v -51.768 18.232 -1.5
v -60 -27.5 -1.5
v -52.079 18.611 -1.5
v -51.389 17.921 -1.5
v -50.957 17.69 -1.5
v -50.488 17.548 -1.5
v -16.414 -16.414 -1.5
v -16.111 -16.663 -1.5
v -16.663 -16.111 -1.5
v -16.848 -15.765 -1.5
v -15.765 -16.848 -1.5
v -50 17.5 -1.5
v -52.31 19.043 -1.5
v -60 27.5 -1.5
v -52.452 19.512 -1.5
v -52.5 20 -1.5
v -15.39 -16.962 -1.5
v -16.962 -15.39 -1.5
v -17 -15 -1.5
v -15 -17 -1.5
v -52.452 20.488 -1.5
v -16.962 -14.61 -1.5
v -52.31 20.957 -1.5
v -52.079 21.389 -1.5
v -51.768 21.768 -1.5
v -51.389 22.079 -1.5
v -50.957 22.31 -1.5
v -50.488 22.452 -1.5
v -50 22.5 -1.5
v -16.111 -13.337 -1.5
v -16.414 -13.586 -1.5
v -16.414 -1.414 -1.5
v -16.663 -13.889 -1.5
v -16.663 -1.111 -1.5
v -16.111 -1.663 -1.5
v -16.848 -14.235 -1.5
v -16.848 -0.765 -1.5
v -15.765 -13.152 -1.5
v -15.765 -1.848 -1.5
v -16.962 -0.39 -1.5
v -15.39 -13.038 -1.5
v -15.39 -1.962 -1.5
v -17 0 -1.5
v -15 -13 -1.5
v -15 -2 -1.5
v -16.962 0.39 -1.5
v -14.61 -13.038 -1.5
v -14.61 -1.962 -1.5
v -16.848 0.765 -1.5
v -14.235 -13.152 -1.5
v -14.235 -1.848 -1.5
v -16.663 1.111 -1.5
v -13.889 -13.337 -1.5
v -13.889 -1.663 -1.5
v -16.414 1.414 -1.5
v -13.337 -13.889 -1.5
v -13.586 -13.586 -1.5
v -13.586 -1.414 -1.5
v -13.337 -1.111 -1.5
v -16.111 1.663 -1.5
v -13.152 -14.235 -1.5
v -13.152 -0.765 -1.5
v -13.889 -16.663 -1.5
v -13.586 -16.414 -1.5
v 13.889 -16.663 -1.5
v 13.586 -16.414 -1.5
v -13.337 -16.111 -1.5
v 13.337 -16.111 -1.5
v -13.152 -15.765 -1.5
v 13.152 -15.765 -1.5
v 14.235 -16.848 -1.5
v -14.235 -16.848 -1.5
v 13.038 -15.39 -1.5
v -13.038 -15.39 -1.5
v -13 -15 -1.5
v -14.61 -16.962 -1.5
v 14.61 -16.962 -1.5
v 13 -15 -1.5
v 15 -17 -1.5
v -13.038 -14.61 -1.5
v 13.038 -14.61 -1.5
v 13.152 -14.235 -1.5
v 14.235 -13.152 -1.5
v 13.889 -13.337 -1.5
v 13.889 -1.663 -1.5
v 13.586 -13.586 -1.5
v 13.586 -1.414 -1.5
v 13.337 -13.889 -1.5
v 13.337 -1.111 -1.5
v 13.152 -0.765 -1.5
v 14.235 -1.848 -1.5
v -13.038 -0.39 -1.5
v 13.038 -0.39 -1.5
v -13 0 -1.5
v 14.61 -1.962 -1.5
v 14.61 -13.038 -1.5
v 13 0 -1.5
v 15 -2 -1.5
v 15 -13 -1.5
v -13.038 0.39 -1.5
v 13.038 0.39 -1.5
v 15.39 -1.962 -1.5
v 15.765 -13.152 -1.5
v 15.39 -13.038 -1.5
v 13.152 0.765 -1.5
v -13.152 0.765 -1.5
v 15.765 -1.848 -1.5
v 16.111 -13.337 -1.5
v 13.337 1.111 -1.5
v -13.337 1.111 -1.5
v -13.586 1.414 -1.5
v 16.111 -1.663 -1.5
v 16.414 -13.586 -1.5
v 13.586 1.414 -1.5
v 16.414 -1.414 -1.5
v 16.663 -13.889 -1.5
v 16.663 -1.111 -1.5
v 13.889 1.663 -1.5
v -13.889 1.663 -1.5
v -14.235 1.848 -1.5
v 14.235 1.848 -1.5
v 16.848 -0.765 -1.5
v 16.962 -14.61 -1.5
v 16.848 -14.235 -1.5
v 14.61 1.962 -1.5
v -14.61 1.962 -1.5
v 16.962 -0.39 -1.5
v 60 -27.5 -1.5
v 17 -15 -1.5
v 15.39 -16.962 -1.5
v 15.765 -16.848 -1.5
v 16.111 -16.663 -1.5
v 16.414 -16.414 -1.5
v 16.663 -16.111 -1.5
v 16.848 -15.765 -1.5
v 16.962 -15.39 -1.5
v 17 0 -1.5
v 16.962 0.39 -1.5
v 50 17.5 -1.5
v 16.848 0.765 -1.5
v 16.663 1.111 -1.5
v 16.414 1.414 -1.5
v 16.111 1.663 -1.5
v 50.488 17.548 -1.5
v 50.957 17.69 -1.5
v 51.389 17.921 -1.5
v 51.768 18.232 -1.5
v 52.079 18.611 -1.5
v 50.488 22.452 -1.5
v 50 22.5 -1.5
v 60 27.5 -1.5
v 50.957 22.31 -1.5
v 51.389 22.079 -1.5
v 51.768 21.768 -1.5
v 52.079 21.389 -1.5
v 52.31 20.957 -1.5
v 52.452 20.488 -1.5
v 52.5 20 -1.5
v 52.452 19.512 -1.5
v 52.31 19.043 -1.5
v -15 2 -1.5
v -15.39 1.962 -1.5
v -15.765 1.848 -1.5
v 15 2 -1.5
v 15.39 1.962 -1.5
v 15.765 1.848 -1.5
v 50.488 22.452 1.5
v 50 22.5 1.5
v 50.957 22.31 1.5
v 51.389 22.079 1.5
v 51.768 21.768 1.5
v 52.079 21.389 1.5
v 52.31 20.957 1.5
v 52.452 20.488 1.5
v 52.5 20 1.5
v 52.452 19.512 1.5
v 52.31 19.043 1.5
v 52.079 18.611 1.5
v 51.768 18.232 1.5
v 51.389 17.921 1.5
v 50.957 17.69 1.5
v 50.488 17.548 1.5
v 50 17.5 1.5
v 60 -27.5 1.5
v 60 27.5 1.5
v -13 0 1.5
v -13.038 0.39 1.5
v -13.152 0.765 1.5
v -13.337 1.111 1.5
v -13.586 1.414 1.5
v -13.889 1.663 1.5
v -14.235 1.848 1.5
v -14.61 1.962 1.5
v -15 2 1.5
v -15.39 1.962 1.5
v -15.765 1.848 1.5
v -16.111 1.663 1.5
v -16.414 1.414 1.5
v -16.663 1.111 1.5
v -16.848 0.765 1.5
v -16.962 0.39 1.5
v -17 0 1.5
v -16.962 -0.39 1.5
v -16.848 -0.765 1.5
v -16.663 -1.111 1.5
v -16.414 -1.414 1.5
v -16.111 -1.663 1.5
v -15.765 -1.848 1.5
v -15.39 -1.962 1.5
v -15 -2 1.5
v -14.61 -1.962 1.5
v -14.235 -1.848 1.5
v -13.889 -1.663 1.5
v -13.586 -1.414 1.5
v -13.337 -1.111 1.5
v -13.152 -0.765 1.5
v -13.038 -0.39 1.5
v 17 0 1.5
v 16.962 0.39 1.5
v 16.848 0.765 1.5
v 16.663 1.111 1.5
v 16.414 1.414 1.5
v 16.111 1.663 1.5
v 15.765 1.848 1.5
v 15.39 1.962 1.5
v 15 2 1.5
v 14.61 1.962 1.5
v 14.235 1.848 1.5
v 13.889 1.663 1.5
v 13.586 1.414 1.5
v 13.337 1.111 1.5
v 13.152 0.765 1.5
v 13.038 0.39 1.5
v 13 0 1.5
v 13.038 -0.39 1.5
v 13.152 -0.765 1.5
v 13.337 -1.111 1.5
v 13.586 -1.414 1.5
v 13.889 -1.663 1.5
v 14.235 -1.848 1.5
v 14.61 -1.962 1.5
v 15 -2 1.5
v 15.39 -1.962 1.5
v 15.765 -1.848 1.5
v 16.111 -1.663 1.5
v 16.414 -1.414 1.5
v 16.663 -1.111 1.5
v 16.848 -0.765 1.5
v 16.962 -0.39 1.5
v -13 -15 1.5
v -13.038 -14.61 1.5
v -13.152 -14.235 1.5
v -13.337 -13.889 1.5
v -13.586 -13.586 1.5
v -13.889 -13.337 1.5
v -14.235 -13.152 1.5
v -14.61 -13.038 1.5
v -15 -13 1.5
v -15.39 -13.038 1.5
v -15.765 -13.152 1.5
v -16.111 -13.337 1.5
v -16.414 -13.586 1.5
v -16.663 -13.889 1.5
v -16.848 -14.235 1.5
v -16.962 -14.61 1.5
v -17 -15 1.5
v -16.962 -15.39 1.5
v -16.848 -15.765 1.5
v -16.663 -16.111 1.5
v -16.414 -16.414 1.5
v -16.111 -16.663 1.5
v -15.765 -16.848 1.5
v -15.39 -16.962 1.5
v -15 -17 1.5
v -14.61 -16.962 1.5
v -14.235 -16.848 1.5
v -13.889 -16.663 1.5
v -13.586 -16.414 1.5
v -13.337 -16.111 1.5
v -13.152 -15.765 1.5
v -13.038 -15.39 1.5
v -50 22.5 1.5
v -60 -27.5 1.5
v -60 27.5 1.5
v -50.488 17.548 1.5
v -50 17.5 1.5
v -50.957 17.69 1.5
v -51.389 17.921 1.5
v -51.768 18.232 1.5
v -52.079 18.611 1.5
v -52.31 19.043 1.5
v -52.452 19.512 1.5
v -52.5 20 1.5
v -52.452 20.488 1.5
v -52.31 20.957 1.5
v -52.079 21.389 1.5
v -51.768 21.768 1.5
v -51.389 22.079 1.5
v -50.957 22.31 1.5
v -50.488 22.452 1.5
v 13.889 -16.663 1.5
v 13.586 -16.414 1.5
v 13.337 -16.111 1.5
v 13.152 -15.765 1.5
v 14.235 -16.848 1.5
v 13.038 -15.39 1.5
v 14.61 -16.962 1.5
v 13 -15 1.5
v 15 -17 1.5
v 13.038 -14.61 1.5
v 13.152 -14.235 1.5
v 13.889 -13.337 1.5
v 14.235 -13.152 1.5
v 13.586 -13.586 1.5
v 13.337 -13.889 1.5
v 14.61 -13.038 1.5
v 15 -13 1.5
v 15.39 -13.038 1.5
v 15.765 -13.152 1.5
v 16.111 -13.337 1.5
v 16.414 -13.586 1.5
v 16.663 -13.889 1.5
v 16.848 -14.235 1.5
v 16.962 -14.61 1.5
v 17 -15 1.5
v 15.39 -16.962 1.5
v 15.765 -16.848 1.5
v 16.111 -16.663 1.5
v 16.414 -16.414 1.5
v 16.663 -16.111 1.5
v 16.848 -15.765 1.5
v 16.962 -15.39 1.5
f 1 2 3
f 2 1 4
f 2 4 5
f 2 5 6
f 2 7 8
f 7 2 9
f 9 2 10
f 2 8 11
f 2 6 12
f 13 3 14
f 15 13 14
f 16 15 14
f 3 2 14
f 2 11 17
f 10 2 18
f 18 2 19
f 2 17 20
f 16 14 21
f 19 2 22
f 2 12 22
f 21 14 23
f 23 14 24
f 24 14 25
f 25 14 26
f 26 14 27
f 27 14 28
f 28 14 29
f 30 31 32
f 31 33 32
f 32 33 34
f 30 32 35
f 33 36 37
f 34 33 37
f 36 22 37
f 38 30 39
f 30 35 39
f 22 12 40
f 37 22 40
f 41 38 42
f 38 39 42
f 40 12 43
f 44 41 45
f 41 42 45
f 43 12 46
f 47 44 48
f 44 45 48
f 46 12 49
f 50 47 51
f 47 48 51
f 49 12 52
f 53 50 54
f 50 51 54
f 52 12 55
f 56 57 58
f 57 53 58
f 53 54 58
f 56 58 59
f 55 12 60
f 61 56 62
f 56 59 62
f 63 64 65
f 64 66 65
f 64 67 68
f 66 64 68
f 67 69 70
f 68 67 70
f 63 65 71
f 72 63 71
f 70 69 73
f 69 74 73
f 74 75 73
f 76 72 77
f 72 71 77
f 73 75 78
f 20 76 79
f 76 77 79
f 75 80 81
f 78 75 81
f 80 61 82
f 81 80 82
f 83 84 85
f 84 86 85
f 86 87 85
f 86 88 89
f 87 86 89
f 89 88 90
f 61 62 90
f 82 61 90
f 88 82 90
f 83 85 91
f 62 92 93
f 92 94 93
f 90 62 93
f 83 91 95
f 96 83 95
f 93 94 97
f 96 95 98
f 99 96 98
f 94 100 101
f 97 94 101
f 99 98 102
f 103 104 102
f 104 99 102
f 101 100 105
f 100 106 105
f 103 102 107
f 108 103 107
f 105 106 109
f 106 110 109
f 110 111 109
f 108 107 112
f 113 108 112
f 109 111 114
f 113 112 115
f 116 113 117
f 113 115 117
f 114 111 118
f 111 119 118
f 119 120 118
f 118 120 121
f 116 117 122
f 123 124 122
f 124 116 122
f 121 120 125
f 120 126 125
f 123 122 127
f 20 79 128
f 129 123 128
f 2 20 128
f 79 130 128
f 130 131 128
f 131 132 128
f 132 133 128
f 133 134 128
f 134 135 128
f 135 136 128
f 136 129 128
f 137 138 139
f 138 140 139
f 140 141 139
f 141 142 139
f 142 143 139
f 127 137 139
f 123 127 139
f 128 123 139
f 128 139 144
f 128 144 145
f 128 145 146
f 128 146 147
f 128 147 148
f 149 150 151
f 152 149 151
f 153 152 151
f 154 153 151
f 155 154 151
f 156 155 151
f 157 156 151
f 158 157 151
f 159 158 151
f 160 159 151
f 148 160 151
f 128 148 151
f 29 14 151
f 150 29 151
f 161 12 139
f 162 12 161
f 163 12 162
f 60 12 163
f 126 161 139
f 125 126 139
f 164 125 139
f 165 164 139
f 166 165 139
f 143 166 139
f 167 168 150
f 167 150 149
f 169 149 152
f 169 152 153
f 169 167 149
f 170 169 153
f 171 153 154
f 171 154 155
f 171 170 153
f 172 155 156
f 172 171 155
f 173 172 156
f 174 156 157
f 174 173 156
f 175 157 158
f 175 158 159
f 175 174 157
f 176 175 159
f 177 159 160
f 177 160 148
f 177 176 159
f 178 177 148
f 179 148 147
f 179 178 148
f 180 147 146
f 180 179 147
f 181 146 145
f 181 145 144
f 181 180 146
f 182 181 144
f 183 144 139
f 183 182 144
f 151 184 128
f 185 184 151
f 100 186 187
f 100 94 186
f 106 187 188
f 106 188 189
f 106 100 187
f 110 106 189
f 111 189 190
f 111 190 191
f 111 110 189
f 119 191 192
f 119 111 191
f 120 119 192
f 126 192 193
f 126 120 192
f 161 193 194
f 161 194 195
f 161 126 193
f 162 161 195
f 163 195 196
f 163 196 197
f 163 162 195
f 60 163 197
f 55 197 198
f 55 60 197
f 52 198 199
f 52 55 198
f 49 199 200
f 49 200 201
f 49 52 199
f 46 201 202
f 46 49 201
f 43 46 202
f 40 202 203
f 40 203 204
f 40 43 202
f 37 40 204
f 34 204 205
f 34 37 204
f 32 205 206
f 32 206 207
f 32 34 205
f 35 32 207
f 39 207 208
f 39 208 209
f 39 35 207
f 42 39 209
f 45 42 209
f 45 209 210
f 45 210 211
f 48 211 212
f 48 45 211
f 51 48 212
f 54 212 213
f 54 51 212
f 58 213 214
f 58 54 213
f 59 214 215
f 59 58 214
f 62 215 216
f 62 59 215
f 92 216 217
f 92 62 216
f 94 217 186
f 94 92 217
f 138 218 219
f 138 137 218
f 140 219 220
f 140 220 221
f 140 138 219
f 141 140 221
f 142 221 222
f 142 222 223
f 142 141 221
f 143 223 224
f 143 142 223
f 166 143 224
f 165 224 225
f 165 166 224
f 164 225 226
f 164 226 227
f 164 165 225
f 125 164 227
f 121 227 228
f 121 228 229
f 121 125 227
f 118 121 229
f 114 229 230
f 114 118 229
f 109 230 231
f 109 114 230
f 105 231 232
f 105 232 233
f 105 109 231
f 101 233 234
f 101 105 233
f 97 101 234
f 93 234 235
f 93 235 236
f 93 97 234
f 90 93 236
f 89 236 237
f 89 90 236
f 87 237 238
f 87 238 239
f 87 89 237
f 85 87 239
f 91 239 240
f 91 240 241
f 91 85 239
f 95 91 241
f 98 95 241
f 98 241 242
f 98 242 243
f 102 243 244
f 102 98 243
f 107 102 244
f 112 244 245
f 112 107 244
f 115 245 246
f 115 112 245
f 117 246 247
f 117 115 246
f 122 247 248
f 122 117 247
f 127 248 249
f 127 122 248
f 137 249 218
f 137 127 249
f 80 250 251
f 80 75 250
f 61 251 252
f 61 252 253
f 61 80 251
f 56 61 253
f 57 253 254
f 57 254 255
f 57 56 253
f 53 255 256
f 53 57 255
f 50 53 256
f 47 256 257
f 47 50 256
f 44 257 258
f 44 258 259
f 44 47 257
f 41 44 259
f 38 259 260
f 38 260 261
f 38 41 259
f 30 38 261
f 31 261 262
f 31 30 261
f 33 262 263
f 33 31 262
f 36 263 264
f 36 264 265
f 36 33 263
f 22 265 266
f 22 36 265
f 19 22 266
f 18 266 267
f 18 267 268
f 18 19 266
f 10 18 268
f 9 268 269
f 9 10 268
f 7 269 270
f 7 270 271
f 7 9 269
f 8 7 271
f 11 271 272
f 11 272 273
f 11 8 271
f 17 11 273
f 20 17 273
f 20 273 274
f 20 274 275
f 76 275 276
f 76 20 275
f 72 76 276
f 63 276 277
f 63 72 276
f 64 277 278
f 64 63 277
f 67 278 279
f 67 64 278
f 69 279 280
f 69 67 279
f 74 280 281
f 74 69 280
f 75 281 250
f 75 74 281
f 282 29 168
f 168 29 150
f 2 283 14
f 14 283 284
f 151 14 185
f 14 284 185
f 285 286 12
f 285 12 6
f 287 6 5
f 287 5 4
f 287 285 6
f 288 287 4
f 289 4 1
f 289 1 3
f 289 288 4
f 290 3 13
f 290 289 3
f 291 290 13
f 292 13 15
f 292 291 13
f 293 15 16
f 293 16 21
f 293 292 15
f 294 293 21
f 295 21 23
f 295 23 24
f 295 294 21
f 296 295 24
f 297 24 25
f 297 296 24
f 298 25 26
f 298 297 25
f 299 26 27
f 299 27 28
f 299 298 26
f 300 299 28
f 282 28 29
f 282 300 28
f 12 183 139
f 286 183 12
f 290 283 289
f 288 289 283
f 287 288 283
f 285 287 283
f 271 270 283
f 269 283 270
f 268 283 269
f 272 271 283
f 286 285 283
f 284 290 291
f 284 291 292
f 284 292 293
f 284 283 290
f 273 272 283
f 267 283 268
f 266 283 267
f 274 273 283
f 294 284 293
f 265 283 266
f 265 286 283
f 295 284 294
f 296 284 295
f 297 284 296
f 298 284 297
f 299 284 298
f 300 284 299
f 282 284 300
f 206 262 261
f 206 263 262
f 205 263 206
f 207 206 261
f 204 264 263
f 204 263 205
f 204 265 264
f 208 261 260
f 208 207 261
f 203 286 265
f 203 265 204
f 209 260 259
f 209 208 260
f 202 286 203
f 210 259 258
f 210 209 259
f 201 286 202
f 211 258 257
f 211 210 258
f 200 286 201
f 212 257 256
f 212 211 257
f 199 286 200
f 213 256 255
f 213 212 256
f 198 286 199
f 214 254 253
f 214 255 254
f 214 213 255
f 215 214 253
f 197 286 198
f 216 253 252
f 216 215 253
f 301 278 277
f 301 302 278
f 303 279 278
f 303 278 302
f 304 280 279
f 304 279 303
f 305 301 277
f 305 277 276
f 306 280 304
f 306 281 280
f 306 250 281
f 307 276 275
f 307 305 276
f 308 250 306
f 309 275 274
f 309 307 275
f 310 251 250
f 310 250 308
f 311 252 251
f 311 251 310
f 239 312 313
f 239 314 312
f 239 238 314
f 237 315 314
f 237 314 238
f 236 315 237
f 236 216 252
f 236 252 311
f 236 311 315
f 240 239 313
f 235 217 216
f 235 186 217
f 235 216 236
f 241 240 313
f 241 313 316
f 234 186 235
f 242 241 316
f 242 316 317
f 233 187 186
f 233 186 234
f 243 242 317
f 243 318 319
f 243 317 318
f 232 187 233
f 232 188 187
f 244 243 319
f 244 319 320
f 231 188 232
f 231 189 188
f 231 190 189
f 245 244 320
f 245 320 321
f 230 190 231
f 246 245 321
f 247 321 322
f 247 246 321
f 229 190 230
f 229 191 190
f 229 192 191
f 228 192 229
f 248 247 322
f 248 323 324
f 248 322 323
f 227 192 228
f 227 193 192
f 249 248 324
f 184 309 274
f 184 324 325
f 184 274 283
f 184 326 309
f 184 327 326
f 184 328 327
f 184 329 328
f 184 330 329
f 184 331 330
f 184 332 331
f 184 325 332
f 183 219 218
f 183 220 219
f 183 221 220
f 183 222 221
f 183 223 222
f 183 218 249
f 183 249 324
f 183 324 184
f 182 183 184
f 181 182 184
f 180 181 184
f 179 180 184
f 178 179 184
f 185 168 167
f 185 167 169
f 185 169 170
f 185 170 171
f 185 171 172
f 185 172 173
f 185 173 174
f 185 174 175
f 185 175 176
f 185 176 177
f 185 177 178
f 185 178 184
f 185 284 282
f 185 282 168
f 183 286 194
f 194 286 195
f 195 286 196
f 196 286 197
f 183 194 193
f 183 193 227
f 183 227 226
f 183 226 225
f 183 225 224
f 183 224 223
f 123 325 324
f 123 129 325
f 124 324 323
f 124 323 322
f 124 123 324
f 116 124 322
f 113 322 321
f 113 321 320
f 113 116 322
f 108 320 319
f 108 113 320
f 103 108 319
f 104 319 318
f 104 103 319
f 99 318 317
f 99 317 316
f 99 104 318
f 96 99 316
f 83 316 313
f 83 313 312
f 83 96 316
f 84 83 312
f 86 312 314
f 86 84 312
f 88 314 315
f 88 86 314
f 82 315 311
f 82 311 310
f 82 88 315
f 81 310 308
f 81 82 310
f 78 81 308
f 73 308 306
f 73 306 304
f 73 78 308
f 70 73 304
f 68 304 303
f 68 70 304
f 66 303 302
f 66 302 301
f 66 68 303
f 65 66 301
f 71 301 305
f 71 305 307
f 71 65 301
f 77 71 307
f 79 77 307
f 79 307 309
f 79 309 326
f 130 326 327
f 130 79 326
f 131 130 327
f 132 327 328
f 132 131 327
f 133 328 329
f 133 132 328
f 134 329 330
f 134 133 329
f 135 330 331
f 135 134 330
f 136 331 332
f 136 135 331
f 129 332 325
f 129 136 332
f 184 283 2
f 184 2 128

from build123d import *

# Parameters (mm, degrees)
SKETCH1_W           = 120
SKETCH1_H           = 55
SKETCH1_R           = 2
BOSS_EXTRUDE1_DEPTH = 1.5


with BuildPart() as part:
    # Sketch1 → Boss-Extrude1 (new body, symmetric)
    with BuildSketch(Plane.XY):
        Rectangle(SKETCH1_W, SKETCH1_H)
        with Locations((-15, 0)):
            Circle(SKETCH1_R, mode=Mode.SUBTRACT)
        with Locations((15, 0)):
            Circle(SKETCH1_R, mode=Mode.SUBTRACT)
        with Locations((15, -15)):
            Circle(SKETCH1_R, mode=Mode.SUBTRACT)
        with Locations((-15, -15)):
            Circle(SKETCH1_R, mode=Mode.SUBTRACT)
        with BuildLine():
            Line((-50, 22.5), (50, 22.5))
            ThreePointArc((50, 22.5), (52.5, 20), (50, 17.5))
            Line((50, 17.5), (-50, 17.5))
            ThreePointArc((-50, 17.5), (-52.5, 20), (-50, 22.5))
        make_face(mode=Mode.SUBTRACT)
    extrude(amount=BOSS_EXTRUDE1_DEPTH, both=True)


solid = part.part
